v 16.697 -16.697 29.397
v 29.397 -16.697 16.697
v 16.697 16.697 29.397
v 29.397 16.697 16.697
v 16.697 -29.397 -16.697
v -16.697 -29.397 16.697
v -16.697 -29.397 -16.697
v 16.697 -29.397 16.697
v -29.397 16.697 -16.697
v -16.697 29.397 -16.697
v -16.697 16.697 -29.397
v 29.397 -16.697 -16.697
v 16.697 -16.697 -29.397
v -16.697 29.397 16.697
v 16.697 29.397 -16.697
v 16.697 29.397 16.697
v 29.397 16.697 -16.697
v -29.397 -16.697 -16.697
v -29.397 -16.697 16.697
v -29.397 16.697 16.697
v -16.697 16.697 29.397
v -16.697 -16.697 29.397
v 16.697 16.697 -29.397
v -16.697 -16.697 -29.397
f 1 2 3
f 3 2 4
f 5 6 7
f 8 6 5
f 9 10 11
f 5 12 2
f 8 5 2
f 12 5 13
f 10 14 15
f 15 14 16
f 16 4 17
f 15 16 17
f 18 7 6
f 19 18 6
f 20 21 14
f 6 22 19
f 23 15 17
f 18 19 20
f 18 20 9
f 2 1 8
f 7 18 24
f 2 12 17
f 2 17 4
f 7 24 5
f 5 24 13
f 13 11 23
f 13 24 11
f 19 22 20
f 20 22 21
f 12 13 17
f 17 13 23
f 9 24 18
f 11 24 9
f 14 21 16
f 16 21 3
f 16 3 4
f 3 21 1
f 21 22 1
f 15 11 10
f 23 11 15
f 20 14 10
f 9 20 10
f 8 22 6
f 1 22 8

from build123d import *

# Parameters (mm, degrees)
F0_W     = 58.7931647897
F0_H     = 58.7931647897
F1_DEPTH = 12.7
F2_W     = 58.7931647897
F2_H     = 16.6965823948
F2_H_2   = 25.4
F3_DEPTH = 58.7931647897
F4_SIZE  = 12.7


with BuildPart() as f1:
    # F0 (on Top) → F1 (new body, symmetric)
    with BuildSketch(Plane.XY):
        Rectangle(F0_W, F0_H)
    extrude(amount=F1_DEPTH, both=True)

    # F2 (on face) → F3 (join, through all)
    with BuildSketch(Plane.XZ.offset(29.3965823948)):
        with Locations((0, 21.0482911974)):
            Rectangle(F2_W, F2_H)
        with Locations((0, -21.0482911974)):
            Rectangle(F2_W, F2_H)
        Rectangle(F2_W, F2_H_2)
    extrude(amount=-F3_DEPTH)

    # F4
    f4_edges = [f1.edges().sort_by_distance(p)[0] for p in [
        (0, 29.396582, 29.396582),
        (-29.396582, 0, 29.396582),
        (-29.396582, 29.396582, 0),
        (29.396582, 0, 29.396582),
        (0, -29.396582, 29.396582),
        (0, 29.396582, -29.396582),
        (29.396582, 29.396582, 0),
        (-29.396582, -29.396582, 0),
        (-29.396582, 0, -29.396582),
        (0, -29.396582, -29.396582),
        (29.396582, -29.396582, 0),
        (29.396582, 0, -29.396582),
    ]]
    chamfer(f4_edges, length=F4_SIZE)


solid = f1.part
